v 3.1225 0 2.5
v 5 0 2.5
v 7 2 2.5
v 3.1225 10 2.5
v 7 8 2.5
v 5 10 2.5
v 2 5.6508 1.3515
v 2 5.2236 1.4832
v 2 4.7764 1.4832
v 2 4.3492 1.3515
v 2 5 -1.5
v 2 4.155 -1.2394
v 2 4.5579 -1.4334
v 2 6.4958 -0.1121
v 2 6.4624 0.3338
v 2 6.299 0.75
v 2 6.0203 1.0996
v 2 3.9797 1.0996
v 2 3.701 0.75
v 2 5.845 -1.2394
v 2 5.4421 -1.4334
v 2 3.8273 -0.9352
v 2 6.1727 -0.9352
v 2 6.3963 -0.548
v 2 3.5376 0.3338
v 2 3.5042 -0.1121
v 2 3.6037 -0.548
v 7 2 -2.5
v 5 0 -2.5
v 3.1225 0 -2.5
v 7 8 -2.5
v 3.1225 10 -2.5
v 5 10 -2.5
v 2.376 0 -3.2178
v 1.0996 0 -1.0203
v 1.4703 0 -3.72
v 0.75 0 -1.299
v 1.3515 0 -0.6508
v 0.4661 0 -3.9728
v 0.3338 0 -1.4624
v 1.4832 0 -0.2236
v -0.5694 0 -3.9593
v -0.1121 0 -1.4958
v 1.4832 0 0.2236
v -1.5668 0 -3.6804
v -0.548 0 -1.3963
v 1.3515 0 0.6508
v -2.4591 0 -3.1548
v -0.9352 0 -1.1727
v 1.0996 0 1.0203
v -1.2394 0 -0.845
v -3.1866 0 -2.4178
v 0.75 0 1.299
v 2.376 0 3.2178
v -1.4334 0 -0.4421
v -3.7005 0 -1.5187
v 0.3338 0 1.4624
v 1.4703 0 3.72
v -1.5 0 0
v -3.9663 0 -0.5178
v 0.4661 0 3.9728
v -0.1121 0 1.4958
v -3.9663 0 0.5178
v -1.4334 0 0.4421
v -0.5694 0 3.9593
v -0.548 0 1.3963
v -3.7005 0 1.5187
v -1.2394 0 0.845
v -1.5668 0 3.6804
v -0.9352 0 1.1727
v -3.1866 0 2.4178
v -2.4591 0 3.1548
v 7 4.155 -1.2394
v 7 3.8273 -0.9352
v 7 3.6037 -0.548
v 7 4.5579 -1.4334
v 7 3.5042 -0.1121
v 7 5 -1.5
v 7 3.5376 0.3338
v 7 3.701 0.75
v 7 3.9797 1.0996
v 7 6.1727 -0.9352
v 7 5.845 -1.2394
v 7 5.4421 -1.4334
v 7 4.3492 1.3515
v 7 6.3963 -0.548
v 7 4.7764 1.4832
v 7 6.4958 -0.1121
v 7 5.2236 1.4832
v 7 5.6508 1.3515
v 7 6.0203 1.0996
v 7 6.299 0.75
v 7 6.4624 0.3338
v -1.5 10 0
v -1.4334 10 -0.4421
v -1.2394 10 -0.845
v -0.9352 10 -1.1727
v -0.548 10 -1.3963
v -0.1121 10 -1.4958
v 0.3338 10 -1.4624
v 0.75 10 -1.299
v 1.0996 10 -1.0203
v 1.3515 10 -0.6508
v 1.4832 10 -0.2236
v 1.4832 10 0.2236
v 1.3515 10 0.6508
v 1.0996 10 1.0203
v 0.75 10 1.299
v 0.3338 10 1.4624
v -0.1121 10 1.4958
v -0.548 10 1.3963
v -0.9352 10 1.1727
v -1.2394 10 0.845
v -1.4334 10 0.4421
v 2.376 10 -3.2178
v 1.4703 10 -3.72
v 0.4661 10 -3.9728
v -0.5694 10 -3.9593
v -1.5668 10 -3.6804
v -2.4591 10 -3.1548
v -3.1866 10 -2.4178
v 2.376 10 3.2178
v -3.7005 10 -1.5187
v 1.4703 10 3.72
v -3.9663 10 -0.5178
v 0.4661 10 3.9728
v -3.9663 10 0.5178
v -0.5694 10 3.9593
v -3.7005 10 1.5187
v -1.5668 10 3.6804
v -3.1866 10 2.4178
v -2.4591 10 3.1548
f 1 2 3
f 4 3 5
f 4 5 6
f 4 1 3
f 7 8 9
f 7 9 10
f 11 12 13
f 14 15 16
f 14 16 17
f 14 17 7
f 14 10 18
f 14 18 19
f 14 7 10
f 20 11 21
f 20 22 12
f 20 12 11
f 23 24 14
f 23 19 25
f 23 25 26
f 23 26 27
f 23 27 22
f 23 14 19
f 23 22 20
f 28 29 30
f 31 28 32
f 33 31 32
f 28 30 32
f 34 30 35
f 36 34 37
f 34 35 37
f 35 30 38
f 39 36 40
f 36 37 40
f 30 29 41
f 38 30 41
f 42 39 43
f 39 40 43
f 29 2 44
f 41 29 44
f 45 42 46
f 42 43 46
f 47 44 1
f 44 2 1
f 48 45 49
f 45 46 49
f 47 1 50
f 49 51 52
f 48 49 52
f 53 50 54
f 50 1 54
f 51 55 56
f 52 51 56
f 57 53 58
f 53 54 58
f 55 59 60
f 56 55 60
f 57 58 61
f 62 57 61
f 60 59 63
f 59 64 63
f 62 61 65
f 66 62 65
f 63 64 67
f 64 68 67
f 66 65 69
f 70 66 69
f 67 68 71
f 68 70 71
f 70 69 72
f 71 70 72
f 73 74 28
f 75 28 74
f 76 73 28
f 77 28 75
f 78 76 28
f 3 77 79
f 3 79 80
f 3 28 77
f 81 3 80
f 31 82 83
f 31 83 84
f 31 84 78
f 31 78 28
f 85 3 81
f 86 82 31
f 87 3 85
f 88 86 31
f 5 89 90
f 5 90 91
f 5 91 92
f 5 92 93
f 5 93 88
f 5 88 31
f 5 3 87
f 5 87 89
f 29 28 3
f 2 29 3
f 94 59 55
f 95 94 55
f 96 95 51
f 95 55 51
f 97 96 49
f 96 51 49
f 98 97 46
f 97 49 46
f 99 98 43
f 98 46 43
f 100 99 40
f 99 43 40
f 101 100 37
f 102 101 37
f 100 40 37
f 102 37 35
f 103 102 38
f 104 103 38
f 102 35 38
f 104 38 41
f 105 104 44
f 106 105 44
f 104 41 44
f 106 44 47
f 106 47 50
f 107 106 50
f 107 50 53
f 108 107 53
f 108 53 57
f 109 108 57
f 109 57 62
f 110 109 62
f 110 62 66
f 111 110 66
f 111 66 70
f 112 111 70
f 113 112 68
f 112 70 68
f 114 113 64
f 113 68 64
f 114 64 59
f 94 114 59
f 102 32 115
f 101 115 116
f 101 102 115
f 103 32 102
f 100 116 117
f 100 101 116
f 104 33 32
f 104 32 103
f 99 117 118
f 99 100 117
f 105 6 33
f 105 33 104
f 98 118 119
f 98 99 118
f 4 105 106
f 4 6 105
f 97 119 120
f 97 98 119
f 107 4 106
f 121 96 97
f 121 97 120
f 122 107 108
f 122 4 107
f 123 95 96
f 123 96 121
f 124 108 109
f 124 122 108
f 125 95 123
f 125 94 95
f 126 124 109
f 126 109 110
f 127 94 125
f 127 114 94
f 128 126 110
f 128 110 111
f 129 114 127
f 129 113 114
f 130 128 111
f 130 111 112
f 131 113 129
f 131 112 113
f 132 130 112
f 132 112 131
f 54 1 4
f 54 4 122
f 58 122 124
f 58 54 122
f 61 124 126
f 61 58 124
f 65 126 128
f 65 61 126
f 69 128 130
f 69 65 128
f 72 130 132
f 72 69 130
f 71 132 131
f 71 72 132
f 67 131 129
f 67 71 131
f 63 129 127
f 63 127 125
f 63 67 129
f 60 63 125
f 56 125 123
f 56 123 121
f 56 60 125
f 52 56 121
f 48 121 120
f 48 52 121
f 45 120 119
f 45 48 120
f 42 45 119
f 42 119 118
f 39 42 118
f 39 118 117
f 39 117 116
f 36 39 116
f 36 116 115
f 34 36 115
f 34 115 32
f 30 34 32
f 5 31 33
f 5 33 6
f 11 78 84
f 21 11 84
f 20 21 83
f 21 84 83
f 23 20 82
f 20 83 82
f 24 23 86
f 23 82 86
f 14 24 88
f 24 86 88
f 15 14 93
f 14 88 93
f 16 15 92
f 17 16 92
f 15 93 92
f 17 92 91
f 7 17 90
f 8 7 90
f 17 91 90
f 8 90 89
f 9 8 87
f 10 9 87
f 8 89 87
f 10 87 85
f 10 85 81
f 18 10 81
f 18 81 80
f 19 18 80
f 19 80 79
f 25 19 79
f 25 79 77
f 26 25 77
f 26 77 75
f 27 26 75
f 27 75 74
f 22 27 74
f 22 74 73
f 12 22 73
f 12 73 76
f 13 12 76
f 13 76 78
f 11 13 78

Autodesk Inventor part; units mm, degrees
ref_plane "XY Plane" through (0, 0, 0) normal (0, 0, 1) x (1, 0, 0)
sketch "Sketch1" plane through (0, 0, 0) normal (0, 1, 0) x (-1, 0, 0)
  circle A0 centre (0, 0) radius 4
  circle A1 centre (0, 0) radius 1.5
  dimension "d0" = 8
  dimension "d1" = 3
extrude "Extrusion1" add sketch "Sketch1" along normal blind 10
ref_plane "Work Plane1" through (4, 0, 0) normal (1, 0, 0) x (0, 1, 0)
sketch "Sketch2" plane through (4, 0, 0) normal (1, 0, 0) x (0, 1, 0)
  line L0 (0, -4) -> (10, -4) projected
  line L1 (10, -4) -> (10, 4) projected
  line L2 (0, -4) -> (10, -4)
  line L3 (10, -4) -> (10, 4)
  line L4 (10, 4) -> (0, 4)
  line L5 (0, 4) -> (0, -4)
  line L6 (0, 0) -> (0, 2.5)
  line L7 (0, -4) -> (0, 4) projected
  line L8 (0, 2.5) -> (0, -2.5)
  line L9 (0, -2.5) -> (10, -2.5)
  line L10 (0, 2.5) -> (10, 2.5)
  dimension "d5" = 2.5
  dimension "d6" = 5
extrude "Extrusion2" add sketch "Sketch2" along normal blind 3 and the other way blind 2.5 contours L5 L10 L1 L9
sketch "Sketch3" plane through (7, 0, 0) normal (1, 0, 0) x (0, 0, -1)
  line L0 (0, 0) -> (0, 10)
  line L1 (4, 10) -> (-4, 10) projected
  circle A0 centre (0, 5) radius 1.5
  point P0 (2.5, 10)
  point P1 (-2.5, 10)
  dimension "d11" = 3
extrude "Extrusion3" cut sketch "Sketch3" against normal blind 5
ref_plane "Work Plane2" through (0, 5, 0) normal (0, 1, 0) x (-1, 0, 0)
chamfer "Chamfer2" distance 2 angle 45 2 edges at (7, 10, 0) (7, 0, 0)
properties part number "joint"
